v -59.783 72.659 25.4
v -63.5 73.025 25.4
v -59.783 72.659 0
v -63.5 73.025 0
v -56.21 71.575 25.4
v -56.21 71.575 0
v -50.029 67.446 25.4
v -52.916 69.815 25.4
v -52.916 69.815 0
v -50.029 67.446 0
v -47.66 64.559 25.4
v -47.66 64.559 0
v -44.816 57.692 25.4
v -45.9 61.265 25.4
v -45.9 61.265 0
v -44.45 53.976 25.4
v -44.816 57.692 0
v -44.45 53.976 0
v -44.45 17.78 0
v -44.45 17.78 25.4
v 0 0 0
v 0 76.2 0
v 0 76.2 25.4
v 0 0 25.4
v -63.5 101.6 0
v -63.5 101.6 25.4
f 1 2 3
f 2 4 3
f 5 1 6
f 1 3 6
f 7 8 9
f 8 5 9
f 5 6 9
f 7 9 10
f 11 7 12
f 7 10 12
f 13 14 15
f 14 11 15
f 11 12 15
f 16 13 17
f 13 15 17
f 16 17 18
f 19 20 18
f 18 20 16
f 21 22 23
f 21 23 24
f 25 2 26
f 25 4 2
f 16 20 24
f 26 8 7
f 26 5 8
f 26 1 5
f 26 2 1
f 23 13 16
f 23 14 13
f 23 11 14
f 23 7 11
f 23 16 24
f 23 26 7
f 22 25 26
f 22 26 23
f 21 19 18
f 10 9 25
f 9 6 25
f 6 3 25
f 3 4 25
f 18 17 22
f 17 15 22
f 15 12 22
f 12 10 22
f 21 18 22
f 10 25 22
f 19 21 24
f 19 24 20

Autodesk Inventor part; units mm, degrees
ref_plane "YZ Plane" through (0, 0, 0) normal (1, 0, 0) x (0, 1, 0)
ref_plane "XZ Plane" through (0, 0, 0) normal (0, 1, 0) x (-1, 0, 0)
ref_plane "XY Plane" through (0, 0, 0) normal (0, 0, 1) x (1, 0, 0)
sketch "Sketch1" plane through (0, 0, 0) normal (0, 0, 1) x (1, 0, 0)
  line L0 (0, 0) -> (-63.5, 25.4)
  line L1 (-63.5, 25.4) -> (-63.5, 76.2)
  line L2 (-63.5, 76.2) -> (0, 76.2)
  line L3 (0, 76.2) -> (0, 0)
  line L4 (-63.5, 76.2) -> (-63.5, 101.6)
  line L5 (-63.5, 101.6) -> (0, 76.2)
  line L6 (0, 76.2) -> (0, 101.6) construction
  dimension "d0" = 76.2
  dimension "d13" = 25.4
  dimension "bottomAngle" = 68.199
  dimension "d16" = 25.4
  dimension "d17" = 68.199
  dimension "d18" = 21.801
  dimension "d19" = 63.5
extrude "Extrusion1" add sketch "Sketch1" along normal blind 25.4
sketch "Sketch2" plane through (0, 0, 25.4) normal (0, 0, 1) x (1, 0, 0)
  line L0 (-63.5, 0) -> (-44.45, 0)
  line L1 (-44.45, 0) -> (-44.45, 73.025)
  line L2 (-44.45, 73.025) -> (-63.5, 73.025)
  line L3 (-63.5, 73.025) -> (-63.5, 0)
  line L4 (-63.5, 101.6) -> (-63.5, 25.4) projected
  point P0 (0, 0)
  dimension "d7" = 19.05
  dimension "d8" = 73.025
extrude "Extrusion2" cut sketch "Sketch2" against normal through all
fillet "Fillet1" radius 19.05 1 edges at (-44.45, 73.025, 12.7)
sketch "Sketch3" plane through (0, 0, 25.4) normal (0, 0, 1) x (1, 0, 0)
  line L0 (-44.45, 0) -> (-3.175, 0) projected
  line L1 (-44.45, 53.975) -> (-44.45, 17.78) projected
  line L2 (0, 76.2) -> (-63.5, 101.6) projected
  line L3 (-3.175, 0) -> (-44.45, 16.51)
properties part number "At Angle Linear Dim"
